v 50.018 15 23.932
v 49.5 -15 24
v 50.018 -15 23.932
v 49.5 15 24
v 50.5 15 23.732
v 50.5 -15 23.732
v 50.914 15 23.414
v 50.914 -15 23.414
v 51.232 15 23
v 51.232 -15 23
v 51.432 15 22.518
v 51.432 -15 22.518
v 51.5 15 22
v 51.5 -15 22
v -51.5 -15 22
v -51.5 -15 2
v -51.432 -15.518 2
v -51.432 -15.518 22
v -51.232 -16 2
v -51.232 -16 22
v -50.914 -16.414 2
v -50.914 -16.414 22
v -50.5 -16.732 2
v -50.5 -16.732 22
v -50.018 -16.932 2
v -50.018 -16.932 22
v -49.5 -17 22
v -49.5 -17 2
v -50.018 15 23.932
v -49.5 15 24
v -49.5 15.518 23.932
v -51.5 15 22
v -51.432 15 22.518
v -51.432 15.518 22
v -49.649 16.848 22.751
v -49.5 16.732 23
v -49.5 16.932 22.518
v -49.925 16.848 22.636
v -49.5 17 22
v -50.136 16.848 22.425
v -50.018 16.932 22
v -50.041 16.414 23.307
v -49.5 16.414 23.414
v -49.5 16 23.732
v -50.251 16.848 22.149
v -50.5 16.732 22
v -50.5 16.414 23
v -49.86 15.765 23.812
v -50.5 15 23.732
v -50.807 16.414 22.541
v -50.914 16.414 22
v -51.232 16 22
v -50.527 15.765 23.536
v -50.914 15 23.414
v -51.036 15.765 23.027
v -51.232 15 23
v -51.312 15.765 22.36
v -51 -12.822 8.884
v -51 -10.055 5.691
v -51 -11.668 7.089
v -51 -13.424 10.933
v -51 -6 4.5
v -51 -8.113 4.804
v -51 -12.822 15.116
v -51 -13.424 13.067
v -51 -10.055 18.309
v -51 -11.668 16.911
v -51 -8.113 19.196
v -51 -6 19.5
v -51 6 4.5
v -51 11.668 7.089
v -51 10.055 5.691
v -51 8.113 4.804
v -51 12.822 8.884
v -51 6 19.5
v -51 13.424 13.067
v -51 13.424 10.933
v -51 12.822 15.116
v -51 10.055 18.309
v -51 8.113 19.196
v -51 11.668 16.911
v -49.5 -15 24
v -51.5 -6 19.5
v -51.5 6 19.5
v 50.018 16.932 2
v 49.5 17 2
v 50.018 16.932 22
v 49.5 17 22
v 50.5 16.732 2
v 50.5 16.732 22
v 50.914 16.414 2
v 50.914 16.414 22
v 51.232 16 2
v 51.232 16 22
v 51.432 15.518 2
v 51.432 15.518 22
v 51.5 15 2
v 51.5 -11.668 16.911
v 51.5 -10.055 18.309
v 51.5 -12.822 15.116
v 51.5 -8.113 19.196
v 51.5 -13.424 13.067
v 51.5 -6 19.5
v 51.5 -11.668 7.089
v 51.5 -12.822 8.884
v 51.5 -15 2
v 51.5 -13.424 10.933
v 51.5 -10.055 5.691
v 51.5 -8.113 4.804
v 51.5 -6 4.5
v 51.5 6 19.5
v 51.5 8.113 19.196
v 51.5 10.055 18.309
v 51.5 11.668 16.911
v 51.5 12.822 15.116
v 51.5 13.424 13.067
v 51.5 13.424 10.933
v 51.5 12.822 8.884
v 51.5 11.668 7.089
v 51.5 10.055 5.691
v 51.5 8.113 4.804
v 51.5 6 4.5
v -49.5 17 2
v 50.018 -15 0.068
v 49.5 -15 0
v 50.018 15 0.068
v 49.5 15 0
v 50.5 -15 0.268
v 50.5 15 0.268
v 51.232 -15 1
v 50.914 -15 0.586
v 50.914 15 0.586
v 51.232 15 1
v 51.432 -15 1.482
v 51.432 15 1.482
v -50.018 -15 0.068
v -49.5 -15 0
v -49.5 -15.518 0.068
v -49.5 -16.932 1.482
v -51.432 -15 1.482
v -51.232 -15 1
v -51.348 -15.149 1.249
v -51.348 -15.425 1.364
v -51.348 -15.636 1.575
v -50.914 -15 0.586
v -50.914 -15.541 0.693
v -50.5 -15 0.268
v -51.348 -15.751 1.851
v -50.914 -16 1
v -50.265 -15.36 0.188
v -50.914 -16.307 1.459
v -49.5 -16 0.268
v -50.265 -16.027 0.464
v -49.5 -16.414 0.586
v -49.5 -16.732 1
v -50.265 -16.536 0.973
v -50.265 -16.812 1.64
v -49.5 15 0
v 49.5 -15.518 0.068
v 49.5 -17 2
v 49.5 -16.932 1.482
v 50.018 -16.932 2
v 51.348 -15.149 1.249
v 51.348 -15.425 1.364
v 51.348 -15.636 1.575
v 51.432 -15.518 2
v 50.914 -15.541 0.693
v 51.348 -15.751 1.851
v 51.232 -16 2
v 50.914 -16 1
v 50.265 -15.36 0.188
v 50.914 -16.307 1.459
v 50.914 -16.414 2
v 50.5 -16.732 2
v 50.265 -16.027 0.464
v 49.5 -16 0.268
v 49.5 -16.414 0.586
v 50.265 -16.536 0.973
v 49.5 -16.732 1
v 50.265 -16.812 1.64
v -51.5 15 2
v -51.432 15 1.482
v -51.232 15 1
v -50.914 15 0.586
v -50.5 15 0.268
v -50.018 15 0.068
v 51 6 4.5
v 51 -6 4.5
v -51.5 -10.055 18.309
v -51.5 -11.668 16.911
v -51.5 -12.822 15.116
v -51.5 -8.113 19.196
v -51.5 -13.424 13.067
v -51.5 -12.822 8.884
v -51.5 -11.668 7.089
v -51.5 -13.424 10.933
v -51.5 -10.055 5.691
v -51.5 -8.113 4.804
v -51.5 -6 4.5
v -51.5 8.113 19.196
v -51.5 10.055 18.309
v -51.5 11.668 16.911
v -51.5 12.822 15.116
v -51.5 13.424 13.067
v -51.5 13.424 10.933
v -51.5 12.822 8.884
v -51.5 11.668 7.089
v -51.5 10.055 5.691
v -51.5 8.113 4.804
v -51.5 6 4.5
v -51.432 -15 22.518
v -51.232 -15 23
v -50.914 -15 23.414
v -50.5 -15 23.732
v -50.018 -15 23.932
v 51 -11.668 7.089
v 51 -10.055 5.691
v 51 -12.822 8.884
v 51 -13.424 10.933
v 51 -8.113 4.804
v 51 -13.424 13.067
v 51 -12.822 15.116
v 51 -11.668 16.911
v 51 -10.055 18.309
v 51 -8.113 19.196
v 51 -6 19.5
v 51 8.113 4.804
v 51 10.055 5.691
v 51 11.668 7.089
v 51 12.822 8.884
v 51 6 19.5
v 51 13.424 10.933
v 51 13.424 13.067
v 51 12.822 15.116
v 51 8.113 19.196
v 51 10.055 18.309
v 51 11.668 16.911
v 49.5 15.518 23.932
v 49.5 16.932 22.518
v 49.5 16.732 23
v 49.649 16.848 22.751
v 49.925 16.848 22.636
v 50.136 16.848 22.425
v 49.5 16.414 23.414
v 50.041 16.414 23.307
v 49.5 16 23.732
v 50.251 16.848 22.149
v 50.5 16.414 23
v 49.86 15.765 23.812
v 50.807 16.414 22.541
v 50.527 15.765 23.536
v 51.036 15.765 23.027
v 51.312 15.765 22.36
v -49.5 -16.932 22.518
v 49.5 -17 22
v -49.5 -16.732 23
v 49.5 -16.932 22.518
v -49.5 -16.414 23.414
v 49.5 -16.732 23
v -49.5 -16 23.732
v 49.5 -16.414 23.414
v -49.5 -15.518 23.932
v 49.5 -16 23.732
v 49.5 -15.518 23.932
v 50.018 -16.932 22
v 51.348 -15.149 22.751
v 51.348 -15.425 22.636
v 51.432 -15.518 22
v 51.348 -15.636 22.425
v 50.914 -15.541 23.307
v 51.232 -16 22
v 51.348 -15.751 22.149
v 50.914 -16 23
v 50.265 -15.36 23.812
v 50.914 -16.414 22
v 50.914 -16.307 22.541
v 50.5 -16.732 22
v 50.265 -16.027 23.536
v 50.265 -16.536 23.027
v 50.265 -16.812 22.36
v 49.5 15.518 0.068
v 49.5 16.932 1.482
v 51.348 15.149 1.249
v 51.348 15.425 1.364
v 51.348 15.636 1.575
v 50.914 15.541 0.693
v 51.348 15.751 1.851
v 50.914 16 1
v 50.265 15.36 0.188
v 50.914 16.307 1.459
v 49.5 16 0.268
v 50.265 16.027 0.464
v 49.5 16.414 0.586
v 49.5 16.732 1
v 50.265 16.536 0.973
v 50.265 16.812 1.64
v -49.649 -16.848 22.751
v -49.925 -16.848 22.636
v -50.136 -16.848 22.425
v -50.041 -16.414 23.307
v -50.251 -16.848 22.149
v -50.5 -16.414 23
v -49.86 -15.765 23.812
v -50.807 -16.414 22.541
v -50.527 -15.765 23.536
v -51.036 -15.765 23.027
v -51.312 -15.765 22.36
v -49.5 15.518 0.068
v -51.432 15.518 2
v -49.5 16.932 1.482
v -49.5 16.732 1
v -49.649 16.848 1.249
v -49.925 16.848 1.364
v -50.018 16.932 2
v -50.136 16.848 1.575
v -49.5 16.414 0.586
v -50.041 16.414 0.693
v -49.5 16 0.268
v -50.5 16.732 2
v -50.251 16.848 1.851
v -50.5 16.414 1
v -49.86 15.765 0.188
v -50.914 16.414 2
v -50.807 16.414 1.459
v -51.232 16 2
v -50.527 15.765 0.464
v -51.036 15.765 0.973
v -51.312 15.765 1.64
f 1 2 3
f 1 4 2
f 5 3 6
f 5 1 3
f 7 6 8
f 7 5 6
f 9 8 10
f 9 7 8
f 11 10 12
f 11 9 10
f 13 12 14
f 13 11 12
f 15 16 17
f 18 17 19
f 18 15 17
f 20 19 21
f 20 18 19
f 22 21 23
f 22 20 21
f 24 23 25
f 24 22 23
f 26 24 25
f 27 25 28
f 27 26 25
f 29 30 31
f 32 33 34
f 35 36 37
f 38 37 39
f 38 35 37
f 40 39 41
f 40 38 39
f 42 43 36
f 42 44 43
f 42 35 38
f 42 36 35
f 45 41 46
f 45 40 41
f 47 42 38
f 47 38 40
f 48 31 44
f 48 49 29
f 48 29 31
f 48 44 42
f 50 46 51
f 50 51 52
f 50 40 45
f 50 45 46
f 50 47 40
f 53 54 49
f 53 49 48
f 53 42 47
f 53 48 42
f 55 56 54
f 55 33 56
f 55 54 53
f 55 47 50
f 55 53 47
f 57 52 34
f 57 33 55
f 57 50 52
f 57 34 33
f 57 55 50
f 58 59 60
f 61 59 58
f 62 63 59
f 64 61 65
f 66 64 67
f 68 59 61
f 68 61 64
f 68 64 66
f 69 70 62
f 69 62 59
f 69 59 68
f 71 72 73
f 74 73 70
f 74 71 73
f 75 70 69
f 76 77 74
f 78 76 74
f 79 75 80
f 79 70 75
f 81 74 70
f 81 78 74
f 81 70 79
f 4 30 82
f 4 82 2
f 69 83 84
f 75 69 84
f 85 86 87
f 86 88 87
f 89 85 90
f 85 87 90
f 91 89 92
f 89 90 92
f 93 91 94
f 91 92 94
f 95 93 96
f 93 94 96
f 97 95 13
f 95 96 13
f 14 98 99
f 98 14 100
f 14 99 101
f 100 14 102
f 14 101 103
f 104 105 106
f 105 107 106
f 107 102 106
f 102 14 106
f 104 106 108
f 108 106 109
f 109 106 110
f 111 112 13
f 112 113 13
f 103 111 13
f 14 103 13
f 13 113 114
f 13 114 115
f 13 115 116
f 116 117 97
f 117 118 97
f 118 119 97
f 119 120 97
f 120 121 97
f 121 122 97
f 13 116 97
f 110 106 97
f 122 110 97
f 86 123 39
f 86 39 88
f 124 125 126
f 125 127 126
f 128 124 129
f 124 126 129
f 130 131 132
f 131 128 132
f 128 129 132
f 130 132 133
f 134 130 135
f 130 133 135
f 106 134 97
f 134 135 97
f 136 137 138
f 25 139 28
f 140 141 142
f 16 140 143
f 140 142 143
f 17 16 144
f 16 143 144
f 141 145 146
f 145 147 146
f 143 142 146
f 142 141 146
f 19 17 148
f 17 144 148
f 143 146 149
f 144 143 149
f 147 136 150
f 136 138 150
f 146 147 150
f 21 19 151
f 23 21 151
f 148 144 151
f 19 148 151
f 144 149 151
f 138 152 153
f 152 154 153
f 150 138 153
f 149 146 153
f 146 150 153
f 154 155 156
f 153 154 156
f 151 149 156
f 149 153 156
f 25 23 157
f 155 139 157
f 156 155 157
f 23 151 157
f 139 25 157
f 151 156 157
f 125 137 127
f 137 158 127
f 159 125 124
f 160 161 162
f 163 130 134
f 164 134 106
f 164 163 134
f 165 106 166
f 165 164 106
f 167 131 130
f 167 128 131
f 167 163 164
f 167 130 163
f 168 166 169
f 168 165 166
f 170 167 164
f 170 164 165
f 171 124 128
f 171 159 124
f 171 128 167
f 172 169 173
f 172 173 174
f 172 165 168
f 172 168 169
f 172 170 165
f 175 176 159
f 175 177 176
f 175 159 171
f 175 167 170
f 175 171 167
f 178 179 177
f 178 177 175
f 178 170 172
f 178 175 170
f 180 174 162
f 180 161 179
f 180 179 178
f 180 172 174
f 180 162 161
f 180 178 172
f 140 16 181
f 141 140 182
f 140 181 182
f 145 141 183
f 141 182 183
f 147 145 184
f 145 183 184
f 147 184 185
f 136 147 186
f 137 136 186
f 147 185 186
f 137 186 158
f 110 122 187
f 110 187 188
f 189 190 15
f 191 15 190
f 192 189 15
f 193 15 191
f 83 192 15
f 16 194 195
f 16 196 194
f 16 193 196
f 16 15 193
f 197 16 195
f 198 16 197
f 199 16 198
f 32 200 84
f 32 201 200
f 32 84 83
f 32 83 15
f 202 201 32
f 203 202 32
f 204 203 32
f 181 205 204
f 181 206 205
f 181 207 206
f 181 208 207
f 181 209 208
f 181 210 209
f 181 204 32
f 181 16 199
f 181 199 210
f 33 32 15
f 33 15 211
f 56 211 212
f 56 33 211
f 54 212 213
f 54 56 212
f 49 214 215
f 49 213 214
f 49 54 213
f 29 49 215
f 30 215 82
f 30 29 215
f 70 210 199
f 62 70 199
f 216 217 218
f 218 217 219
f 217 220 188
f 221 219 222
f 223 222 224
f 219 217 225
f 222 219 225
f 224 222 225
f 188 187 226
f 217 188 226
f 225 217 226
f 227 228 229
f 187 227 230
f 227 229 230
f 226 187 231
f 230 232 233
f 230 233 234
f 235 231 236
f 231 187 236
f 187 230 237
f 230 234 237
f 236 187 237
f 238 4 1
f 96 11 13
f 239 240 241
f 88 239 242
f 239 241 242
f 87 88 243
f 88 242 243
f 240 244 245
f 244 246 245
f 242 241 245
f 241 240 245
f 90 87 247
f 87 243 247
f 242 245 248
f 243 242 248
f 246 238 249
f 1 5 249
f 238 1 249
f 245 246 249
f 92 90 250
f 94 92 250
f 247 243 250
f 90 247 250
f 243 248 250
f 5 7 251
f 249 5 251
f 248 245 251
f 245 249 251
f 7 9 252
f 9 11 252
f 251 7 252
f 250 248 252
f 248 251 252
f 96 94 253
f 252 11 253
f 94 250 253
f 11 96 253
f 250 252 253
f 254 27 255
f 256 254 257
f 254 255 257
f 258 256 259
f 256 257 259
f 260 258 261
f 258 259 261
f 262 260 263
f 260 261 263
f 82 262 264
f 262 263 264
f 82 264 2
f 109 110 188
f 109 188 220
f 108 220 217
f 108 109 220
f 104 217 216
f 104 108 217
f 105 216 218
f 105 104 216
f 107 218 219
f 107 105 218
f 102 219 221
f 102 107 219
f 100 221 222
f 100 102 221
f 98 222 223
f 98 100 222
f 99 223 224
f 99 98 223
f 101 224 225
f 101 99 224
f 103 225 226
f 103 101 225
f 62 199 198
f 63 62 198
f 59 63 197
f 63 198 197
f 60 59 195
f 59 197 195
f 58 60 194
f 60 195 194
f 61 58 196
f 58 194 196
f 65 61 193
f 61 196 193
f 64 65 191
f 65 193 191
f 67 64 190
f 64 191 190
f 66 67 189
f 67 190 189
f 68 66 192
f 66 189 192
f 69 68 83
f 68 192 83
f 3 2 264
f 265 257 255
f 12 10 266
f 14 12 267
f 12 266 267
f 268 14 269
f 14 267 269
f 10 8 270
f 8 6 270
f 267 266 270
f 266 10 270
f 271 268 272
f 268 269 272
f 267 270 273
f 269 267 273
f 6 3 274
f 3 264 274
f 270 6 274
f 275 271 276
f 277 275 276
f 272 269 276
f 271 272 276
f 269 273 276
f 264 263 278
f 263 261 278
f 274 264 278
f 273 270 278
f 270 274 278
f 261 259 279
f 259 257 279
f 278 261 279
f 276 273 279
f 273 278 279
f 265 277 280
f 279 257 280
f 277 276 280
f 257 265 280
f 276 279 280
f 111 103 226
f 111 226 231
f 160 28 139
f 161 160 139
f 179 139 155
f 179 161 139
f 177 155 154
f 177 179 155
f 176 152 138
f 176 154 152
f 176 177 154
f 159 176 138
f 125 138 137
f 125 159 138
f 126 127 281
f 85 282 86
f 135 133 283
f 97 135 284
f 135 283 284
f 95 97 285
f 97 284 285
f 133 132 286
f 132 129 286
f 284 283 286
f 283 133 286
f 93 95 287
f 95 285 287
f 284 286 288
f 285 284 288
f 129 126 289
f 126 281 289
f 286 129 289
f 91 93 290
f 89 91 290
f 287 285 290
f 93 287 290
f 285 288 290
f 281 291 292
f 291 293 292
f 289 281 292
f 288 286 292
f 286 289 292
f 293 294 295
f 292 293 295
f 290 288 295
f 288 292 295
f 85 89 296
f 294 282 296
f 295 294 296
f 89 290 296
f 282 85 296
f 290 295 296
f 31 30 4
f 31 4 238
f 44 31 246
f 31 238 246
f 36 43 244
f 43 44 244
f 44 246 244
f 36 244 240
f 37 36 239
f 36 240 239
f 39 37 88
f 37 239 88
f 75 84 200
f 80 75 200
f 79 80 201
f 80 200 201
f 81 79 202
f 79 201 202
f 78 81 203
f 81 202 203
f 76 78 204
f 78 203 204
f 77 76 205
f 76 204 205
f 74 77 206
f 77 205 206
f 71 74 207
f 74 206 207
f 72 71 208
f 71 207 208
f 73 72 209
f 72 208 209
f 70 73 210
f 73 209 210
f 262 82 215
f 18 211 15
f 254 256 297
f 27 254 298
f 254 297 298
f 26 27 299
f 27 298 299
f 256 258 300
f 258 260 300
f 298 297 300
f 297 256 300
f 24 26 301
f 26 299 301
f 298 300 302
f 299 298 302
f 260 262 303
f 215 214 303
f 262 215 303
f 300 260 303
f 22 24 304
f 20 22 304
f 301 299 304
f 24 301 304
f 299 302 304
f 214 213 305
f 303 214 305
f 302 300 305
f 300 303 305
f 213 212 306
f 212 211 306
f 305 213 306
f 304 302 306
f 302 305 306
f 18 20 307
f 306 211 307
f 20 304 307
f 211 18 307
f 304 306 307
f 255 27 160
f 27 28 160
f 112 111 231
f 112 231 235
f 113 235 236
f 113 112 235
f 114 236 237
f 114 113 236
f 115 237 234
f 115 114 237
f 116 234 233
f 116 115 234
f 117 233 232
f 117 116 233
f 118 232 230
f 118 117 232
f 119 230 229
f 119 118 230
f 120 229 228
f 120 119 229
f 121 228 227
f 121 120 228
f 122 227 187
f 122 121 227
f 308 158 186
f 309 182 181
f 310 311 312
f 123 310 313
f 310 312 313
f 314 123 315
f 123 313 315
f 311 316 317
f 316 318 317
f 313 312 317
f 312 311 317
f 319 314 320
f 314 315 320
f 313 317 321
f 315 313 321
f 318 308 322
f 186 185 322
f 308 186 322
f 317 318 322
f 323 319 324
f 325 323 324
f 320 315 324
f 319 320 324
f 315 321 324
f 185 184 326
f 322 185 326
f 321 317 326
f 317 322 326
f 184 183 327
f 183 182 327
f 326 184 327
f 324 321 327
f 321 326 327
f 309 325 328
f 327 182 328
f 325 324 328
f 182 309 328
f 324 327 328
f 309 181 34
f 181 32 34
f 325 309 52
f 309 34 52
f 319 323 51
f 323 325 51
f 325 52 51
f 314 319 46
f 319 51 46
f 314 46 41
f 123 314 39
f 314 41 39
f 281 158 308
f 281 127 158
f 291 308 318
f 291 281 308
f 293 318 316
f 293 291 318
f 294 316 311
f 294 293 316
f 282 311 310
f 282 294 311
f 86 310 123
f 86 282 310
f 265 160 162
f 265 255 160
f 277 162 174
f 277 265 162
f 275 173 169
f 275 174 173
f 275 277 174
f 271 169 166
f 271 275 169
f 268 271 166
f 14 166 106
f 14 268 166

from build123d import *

# Parameters (mm, degrees)
ESBO_O1_W                = 103
ESBO_O1_H                = 34
RESSALTO_EXTRUS_O1_DEPTH = 24
CORTE_EXTRUS_O1_DEPTH    = 0.5
FILETE1_R                = 2


with BuildPart() as part:
    # Esboço1 → Ressalto-extrusão1 (new body)
    with BuildSketch(Plane.XY):
        Rectangle(ESBO_O1_W, ESBO_O1_H)
    extrude(amount=RESSALTO_EXTRUS_O1_DEPTH)

    # Esboço2 → Corte-extrusão1 (cut)
    with BuildSketch(Plane(origin=(51.5, 0, 0), x_dir=(0, 0, -1), z_dir=(1, 0, 0))):
        with BuildLine():
            Line((-4.5, 6), (-4.5, -6))
            ThreePointArc((-4.5, -6), (-12, -13.5), (-19.5, -6))
            Line((-19.5, -6), (-19.5, 6))
            ThreePointArc((-19.5, 6), (-12, 13.5), (-4.5, 6))
        make_face()
    corte_extrus_o1 = extrude(amount=-CORTE_EXTRUS_O1_DEPTH, mode=Mode.SUBTRACT)

    # Espelhar1: Corte-extrusão1 across plane
    add(corte_extrus_o1.mirror(Plane(origin=(0, 0, 0), x_dir=(0, 0, 1), z_dir=(1, 0, 0))), mode=Mode.SUBTRACT)

    # Filete1
    filete1_edges = [part.edges().sort_by_distance(p)[0] for p in [
        (-51.5, 0, 24),
        (0, -17, 24),
        (51.5, 0, 24),
        (0, -17, 0),
        (-51.5, 0, 0),
        (0, 17, 0),
        (51.5, 0, 0),
        (0, 17, 24),
        (51.5, -17, 12),
        (-51.5, -17, 12),
        (-51.5, 17, 12),
        (51.5, 17, 12),
    ]]
    fillet(filete1_edges, radius=FILETE1_R)


solid = part.part
